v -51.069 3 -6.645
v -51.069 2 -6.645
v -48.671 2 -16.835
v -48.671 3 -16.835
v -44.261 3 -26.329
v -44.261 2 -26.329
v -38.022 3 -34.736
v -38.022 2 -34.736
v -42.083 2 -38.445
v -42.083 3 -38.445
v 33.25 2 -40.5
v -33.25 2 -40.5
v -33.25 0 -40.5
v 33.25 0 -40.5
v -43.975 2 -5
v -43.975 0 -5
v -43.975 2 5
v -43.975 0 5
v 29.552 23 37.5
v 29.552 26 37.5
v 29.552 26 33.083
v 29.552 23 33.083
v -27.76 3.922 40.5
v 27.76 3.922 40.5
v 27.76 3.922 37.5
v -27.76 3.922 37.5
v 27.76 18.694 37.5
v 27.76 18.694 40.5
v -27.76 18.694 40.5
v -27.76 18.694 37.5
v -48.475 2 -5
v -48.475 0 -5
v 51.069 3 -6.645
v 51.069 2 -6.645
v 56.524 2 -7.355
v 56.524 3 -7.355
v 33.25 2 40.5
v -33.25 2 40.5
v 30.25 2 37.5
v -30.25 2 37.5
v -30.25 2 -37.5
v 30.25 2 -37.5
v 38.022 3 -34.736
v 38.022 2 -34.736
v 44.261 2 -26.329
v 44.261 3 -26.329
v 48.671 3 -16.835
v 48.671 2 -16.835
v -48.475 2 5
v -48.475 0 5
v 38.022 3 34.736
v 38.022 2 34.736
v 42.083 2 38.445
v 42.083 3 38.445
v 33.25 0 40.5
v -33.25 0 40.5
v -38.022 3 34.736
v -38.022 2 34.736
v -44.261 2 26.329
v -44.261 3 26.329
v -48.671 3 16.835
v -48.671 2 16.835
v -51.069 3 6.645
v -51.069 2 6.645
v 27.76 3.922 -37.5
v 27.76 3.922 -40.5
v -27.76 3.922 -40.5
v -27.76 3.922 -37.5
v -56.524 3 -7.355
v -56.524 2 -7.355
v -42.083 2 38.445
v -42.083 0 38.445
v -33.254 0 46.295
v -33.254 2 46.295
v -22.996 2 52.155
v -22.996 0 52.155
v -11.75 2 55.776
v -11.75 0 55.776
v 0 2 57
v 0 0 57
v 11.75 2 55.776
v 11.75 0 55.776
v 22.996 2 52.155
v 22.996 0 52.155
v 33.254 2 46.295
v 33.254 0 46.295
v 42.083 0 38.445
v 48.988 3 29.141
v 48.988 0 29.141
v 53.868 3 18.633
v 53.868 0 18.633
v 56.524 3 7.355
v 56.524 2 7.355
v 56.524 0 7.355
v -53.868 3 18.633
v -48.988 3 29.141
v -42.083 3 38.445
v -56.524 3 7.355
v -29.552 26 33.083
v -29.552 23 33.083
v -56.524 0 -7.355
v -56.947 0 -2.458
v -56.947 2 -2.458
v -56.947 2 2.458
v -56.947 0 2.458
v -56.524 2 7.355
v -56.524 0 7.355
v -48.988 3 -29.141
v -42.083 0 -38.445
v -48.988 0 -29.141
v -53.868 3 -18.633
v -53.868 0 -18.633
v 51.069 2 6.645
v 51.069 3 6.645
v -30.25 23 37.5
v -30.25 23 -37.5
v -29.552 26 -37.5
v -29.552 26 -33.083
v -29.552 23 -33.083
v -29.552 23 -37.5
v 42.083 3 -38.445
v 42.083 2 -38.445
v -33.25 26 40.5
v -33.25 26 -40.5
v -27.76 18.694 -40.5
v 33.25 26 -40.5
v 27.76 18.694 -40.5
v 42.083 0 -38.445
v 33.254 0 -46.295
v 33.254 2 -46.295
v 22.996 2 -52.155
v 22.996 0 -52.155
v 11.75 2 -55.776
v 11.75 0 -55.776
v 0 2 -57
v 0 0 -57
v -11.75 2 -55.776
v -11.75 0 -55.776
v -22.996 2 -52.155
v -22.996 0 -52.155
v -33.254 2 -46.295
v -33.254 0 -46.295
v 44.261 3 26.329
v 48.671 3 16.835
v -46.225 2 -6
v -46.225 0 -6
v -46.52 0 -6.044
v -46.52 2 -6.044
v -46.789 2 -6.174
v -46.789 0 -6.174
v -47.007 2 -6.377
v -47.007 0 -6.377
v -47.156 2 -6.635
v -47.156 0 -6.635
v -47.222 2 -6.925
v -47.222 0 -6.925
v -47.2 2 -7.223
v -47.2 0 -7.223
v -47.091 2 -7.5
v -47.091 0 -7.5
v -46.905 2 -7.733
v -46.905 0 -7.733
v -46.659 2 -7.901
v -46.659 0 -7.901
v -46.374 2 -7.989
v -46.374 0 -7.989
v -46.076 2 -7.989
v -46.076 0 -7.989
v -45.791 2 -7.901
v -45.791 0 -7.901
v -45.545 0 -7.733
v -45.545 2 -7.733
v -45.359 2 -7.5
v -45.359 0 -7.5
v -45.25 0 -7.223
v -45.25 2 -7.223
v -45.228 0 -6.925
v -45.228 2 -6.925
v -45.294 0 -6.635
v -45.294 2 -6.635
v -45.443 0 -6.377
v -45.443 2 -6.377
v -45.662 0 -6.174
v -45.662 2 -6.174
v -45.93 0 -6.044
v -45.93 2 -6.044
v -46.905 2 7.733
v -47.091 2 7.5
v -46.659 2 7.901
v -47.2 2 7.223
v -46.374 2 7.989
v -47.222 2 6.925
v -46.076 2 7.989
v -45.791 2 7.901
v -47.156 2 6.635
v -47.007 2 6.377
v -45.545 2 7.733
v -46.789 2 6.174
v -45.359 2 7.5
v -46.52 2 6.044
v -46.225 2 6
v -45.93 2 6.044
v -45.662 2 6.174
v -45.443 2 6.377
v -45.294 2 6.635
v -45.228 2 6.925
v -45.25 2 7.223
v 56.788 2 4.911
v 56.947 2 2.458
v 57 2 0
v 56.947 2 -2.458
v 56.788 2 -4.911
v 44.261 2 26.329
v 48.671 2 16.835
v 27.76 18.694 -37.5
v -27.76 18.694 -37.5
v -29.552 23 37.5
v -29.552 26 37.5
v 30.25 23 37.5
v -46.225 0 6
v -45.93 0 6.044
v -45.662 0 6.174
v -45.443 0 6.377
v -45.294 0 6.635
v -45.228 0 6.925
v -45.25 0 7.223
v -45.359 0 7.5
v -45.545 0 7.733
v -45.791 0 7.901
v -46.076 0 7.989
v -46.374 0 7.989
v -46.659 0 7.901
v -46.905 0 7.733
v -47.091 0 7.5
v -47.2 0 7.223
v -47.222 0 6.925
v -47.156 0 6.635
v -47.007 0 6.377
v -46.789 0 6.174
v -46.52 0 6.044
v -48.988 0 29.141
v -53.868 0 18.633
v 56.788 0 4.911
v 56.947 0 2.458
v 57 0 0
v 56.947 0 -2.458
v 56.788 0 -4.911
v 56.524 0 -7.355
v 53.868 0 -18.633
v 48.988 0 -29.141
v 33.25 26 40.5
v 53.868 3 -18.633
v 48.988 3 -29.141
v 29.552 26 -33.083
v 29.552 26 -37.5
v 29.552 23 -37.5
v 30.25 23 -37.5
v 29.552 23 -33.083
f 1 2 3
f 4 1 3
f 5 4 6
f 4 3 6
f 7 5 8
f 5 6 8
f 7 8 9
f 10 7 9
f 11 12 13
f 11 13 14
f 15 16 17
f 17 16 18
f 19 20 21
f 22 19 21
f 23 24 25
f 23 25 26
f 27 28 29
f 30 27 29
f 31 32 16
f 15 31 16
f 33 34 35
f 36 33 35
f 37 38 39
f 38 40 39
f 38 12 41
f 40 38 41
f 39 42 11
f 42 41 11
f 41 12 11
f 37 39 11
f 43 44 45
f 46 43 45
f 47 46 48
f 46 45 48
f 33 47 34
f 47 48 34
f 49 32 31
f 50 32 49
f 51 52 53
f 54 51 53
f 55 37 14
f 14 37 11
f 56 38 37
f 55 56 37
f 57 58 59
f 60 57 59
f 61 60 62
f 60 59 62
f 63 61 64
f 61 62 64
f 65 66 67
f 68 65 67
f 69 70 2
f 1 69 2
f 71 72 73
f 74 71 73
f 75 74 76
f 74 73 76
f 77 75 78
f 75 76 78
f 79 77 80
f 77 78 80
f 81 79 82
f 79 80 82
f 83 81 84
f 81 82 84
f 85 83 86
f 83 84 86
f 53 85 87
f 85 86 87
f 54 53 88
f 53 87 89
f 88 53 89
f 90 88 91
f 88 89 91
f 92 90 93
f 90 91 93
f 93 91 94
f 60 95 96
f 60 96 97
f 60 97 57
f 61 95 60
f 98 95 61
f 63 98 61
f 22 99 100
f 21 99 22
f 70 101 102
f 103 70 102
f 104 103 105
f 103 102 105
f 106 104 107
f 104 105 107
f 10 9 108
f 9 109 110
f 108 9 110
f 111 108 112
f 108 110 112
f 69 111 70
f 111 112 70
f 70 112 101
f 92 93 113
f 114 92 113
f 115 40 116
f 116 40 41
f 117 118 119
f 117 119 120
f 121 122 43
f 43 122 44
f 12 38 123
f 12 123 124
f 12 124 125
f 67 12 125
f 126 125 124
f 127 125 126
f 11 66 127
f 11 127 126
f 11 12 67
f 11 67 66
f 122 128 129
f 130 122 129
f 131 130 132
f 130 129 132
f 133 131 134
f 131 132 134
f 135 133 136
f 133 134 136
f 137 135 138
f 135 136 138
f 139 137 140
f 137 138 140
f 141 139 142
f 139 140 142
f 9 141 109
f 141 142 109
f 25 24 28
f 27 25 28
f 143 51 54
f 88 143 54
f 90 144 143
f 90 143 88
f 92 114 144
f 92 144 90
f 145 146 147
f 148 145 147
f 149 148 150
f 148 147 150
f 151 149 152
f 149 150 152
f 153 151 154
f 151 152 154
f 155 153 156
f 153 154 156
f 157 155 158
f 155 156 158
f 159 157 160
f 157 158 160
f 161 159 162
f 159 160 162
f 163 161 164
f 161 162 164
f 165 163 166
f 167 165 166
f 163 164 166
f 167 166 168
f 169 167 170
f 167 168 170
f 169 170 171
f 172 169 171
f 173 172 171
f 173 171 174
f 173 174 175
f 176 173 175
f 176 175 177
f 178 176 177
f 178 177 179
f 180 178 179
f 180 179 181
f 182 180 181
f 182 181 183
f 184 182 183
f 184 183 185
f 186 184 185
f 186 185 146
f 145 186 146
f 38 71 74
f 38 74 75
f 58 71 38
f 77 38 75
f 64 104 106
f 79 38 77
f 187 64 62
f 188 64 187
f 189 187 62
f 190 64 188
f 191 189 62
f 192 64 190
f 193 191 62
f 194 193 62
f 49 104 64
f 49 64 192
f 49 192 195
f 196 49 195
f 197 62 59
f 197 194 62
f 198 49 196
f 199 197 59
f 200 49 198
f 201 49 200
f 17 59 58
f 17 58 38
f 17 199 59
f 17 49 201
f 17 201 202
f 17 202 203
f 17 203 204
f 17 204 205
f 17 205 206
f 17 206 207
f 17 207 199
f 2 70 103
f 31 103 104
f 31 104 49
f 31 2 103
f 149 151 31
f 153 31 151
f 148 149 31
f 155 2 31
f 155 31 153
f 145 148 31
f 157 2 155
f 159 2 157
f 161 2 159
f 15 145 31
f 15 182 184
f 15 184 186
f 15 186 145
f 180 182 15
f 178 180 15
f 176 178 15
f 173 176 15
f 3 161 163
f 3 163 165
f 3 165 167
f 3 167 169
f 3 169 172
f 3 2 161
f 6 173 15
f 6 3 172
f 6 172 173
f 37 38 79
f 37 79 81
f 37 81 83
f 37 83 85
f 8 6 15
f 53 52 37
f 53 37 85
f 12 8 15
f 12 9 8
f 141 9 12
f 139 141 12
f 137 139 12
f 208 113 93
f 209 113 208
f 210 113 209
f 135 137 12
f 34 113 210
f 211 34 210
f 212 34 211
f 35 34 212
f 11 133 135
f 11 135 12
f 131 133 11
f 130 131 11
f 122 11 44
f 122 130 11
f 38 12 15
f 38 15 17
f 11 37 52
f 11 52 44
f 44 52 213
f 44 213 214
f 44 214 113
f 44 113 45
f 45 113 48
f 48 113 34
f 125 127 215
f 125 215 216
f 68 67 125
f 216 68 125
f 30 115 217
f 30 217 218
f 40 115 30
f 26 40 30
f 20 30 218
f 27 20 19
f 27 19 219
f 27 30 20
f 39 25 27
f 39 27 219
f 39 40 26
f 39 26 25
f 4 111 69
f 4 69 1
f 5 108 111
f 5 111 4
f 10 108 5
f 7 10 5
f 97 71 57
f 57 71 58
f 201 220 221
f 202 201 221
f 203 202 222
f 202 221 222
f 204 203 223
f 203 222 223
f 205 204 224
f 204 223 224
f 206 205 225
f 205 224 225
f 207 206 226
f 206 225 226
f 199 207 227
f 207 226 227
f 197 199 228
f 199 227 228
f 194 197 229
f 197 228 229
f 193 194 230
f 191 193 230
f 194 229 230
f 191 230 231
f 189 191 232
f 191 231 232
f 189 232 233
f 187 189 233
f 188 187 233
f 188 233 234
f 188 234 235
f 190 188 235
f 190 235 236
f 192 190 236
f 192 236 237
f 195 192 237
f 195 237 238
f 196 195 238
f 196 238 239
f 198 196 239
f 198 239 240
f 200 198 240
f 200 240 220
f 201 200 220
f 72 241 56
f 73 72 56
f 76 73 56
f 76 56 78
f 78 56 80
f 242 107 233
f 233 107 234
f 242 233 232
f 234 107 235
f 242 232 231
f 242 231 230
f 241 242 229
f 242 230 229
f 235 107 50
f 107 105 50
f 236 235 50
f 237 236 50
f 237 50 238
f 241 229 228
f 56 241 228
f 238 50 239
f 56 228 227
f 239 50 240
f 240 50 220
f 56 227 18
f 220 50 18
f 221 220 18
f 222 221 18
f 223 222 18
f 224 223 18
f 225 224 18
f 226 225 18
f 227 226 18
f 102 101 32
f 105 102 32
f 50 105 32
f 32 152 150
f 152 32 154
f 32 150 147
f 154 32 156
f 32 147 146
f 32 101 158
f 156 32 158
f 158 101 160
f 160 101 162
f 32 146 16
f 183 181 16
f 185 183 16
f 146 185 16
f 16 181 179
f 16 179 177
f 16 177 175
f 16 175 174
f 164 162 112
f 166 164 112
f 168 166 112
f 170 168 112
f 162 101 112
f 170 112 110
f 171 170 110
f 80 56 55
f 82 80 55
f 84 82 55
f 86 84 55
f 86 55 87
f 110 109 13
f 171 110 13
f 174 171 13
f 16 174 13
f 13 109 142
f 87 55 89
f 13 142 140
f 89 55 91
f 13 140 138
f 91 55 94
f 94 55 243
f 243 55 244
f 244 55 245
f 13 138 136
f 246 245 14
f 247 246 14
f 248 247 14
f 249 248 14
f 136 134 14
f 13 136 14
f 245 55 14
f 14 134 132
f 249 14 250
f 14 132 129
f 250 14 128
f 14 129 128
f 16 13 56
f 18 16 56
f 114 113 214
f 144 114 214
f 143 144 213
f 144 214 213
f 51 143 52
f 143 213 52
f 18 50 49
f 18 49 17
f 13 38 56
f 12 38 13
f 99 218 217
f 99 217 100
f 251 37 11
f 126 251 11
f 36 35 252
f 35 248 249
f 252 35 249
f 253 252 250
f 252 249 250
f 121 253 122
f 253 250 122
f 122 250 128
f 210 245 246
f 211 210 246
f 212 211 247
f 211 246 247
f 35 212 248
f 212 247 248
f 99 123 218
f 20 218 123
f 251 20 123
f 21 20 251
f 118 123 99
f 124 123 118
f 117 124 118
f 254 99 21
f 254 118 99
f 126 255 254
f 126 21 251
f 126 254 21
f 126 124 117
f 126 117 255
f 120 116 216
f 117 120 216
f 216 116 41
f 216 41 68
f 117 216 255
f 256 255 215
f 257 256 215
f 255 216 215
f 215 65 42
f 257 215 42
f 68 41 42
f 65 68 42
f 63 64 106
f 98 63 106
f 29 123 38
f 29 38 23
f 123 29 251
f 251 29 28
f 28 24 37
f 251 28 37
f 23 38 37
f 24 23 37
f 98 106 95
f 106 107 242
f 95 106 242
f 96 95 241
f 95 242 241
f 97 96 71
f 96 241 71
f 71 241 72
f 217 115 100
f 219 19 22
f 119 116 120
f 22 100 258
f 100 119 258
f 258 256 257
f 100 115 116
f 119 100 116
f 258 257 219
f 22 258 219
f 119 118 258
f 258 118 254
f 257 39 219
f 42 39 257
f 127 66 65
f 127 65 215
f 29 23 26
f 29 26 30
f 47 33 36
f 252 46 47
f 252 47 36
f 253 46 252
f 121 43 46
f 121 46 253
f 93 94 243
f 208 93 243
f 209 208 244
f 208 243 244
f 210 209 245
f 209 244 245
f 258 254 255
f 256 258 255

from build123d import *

# Parameters (mm, degrees)
SKETCH1_R           = 57
BOSS_EXTRUDE1_DEPTH = 2
BOSS_EXTRUDE3_DEPTH = 3
SKETCH2_W           = 66.5
SKETCH2_H           = 81
CUT_EXTRUDE1_DEPTH  = 3
SKETCH2_2_W         = 66.5
SKETCH2_2_H         = 81
BOSS_EXTRUDE4_DEPTH = 24
SHELL1_T            = -3
SKETCH3_W           = 55.519367608
SKETCH3_H           = 14.772337279
CUT_EXTRUDE2_DEPTH  = 8
SKETCH4_W           = 59.1038318
SKETCH4_H           = 4.416523669
CUT_EXTRUDE5_DEPTH  = 8
SKETCH5_R           = 1
SKETCH5_W           = 4.5
SKETCH5_H           = 10
CUT_EXTRUDE6_DEPTH  = 8


with BuildPart() as part:
    # Sketch1 → Boss-Extrude1 (new body)
    with BuildSketch(Plane(origin=(0, 0, 0), x_dir=(1, 0, 0), z_dir=(0, 1, 0))):
        Circle(SKETCH1_R)
    extrude(amount=BOSS_EXTRUDE1_DEPTH)

    # Sketch1<4> → Boss-Extrude3 (add)
    with BuildSketch(Plane(origin=(0, 0, 0), x_dir=(1, 0, 0), z_dir=(0, 1, 0))):
        with BuildLine():
            ThreePointArc((-42.082780538, 38.445280363), (-51.695779903, 24.011379391), (-56.523502612, 7.35483871))
            Line((-56.523502612, 7.35483871), (-51.06948043, 6.64516129))
            ThreePointArc((-51.06948043, 6.64516129), (-46.707590614, 21.694491906), (-38.022161363, 34.735648047))
            Line((-38.022161363, 34.735648047), (-42.082780538, 38.445280363))
        make_face()
        with BuildLine():
            Line((-51.06948043, -6.64516129), (-56.523502612, -7.35483871))
            ThreePointArc((-56.523502612, -7.35483871), (-51.695779903, -24.011379391), (-42.082780538, -38.445280363))
            Line((-42.082780538, -38.445280363), (-38.022161363, -34.735648047))
            ThreePointArc((-38.022161363, -34.735648047), (-46.707590614, -21.694491906), (-51.06948043, -6.64516129))
        make_face()
        with BuildLine():
            ThreePointArc((56.523502612, 7.35483871), (51.695779903, 24.011379391), (42.082780538, 38.445280363))
            Line((42.082780538, 38.445280363), (38.022161363, 34.735648047))
            ThreePointArc((38.022161363, 34.735648047), (46.707590614, 21.694491906), (51.06948043, 6.64516129))
            Line((51.06948043, 6.64516129), (56.523502612, 7.35483871))
        make_face()
        with BuildLine():
            Line((38.022161363, -34.735648047), (42.082780538, -38.445280363))
            ThreePointArc((42.082780538, -38.445280363), (51.695779903, -24.011379391), (56.523502612, -7.35483871))
            Line((56.523502612, -7.35483871), (51.06948043, -6.64516129))
            ThreePointArc((51.06948043, -6.64516129), (46.707590614, -21.694491906), (38.022161363, -34.735648047))
        make_face()
    extrude(amount=BOSS_EXTRUDE3_DEPTH)

    # Sketch2 → Cut-Extrude1 (cut)
    with BuildSketch(Plane(origin=(0, 2, 0), x_dir=(1, 0, 0), z_dir=(0, 1, 0))):
        Rectangle(SKETCH2_W, SKETCH2_H)
    extrude(amount=-CUT_EXTRUDE1_DEPTH, mode=Mode.SUBTRACT)

    # Sketch5 → Cut-Extrude6 (cut)
    with BuildSketch(Plane.XZ):
        with Locations((-46.225250229, 7)):
            Circle(SKETCH5_R)
        with Locations((-46.225250229, -7)):
            Circle(SKETCH5_R)
        with Locations((-46.225250229, 0)):
            Rectangle(SKETCH5_W, SKETCH5_H)
    extrude(amount=-CUT_EXTRUDE6_DEPTH, mode=Mode.SUBTRACT)


with BuildPart() as body_2:
    # Sketch2<2> → Boss-Extrude4 (new body)
    with BuildSketch(Plane(origin=(0, 2, 0), x_dir=(1, 0, 0), z_dir=(0, 1, 0))):
        Rectangle(SKETCH2_2_W, SKETCH2_2_H)
    extrude(amount=BOSS_EXTRUDE4_DEPTH)

    # Shell1
    shell1_openings = [body_2.faces().sort_by_distance(p)[0] for p in [
        (0, 2, 0),
    ]]
    offset(amount=SHELL1_T, openings=shell1_openings, kind=Kind.INTERSECTION)

    # Sketch3 → Cut-Extrude2 (cut)
    with BuildSketch(Plane(origin=(0, 0, -40.5), x_dir=(-1, 0, 0), z_dir=(0, 0, -1))):
        with Locations((0, 11.307757027)):
            Rectangle(SKETCH3_W, SKETCH3_H)
    cut_extrude2 = extrude(amount=-CUT_EXTRUDE2_DEPTH, mode=Mode.SUBTRACT)

    # Mirror1: Cut-Extrude2 across plane
    add(cut_extrude2.mirror(Plane.XY), mode=Mode.SUBTRACT)

    # Sketch4 → Cut-Extrude5 (cut)
    with BuildSketch(Plane(origin=(0, 26, 0), x_dir=(1, 0, 0), z_dir=(0, 1, 0))):
        with Locations((0, -35.291738165)):
            Rectangle(SKETCH4_W, SKETCH4_H)
        with Locations((0, 35.291738165)):
            Rectangle(SKETCH4_W, SKETCH4_H)
    extrude(amount=-CUT_EXTRUDE5_DEPTH, mode=Mode.SUBTRACT)


solid = Compound([part.part, body_2.part])
